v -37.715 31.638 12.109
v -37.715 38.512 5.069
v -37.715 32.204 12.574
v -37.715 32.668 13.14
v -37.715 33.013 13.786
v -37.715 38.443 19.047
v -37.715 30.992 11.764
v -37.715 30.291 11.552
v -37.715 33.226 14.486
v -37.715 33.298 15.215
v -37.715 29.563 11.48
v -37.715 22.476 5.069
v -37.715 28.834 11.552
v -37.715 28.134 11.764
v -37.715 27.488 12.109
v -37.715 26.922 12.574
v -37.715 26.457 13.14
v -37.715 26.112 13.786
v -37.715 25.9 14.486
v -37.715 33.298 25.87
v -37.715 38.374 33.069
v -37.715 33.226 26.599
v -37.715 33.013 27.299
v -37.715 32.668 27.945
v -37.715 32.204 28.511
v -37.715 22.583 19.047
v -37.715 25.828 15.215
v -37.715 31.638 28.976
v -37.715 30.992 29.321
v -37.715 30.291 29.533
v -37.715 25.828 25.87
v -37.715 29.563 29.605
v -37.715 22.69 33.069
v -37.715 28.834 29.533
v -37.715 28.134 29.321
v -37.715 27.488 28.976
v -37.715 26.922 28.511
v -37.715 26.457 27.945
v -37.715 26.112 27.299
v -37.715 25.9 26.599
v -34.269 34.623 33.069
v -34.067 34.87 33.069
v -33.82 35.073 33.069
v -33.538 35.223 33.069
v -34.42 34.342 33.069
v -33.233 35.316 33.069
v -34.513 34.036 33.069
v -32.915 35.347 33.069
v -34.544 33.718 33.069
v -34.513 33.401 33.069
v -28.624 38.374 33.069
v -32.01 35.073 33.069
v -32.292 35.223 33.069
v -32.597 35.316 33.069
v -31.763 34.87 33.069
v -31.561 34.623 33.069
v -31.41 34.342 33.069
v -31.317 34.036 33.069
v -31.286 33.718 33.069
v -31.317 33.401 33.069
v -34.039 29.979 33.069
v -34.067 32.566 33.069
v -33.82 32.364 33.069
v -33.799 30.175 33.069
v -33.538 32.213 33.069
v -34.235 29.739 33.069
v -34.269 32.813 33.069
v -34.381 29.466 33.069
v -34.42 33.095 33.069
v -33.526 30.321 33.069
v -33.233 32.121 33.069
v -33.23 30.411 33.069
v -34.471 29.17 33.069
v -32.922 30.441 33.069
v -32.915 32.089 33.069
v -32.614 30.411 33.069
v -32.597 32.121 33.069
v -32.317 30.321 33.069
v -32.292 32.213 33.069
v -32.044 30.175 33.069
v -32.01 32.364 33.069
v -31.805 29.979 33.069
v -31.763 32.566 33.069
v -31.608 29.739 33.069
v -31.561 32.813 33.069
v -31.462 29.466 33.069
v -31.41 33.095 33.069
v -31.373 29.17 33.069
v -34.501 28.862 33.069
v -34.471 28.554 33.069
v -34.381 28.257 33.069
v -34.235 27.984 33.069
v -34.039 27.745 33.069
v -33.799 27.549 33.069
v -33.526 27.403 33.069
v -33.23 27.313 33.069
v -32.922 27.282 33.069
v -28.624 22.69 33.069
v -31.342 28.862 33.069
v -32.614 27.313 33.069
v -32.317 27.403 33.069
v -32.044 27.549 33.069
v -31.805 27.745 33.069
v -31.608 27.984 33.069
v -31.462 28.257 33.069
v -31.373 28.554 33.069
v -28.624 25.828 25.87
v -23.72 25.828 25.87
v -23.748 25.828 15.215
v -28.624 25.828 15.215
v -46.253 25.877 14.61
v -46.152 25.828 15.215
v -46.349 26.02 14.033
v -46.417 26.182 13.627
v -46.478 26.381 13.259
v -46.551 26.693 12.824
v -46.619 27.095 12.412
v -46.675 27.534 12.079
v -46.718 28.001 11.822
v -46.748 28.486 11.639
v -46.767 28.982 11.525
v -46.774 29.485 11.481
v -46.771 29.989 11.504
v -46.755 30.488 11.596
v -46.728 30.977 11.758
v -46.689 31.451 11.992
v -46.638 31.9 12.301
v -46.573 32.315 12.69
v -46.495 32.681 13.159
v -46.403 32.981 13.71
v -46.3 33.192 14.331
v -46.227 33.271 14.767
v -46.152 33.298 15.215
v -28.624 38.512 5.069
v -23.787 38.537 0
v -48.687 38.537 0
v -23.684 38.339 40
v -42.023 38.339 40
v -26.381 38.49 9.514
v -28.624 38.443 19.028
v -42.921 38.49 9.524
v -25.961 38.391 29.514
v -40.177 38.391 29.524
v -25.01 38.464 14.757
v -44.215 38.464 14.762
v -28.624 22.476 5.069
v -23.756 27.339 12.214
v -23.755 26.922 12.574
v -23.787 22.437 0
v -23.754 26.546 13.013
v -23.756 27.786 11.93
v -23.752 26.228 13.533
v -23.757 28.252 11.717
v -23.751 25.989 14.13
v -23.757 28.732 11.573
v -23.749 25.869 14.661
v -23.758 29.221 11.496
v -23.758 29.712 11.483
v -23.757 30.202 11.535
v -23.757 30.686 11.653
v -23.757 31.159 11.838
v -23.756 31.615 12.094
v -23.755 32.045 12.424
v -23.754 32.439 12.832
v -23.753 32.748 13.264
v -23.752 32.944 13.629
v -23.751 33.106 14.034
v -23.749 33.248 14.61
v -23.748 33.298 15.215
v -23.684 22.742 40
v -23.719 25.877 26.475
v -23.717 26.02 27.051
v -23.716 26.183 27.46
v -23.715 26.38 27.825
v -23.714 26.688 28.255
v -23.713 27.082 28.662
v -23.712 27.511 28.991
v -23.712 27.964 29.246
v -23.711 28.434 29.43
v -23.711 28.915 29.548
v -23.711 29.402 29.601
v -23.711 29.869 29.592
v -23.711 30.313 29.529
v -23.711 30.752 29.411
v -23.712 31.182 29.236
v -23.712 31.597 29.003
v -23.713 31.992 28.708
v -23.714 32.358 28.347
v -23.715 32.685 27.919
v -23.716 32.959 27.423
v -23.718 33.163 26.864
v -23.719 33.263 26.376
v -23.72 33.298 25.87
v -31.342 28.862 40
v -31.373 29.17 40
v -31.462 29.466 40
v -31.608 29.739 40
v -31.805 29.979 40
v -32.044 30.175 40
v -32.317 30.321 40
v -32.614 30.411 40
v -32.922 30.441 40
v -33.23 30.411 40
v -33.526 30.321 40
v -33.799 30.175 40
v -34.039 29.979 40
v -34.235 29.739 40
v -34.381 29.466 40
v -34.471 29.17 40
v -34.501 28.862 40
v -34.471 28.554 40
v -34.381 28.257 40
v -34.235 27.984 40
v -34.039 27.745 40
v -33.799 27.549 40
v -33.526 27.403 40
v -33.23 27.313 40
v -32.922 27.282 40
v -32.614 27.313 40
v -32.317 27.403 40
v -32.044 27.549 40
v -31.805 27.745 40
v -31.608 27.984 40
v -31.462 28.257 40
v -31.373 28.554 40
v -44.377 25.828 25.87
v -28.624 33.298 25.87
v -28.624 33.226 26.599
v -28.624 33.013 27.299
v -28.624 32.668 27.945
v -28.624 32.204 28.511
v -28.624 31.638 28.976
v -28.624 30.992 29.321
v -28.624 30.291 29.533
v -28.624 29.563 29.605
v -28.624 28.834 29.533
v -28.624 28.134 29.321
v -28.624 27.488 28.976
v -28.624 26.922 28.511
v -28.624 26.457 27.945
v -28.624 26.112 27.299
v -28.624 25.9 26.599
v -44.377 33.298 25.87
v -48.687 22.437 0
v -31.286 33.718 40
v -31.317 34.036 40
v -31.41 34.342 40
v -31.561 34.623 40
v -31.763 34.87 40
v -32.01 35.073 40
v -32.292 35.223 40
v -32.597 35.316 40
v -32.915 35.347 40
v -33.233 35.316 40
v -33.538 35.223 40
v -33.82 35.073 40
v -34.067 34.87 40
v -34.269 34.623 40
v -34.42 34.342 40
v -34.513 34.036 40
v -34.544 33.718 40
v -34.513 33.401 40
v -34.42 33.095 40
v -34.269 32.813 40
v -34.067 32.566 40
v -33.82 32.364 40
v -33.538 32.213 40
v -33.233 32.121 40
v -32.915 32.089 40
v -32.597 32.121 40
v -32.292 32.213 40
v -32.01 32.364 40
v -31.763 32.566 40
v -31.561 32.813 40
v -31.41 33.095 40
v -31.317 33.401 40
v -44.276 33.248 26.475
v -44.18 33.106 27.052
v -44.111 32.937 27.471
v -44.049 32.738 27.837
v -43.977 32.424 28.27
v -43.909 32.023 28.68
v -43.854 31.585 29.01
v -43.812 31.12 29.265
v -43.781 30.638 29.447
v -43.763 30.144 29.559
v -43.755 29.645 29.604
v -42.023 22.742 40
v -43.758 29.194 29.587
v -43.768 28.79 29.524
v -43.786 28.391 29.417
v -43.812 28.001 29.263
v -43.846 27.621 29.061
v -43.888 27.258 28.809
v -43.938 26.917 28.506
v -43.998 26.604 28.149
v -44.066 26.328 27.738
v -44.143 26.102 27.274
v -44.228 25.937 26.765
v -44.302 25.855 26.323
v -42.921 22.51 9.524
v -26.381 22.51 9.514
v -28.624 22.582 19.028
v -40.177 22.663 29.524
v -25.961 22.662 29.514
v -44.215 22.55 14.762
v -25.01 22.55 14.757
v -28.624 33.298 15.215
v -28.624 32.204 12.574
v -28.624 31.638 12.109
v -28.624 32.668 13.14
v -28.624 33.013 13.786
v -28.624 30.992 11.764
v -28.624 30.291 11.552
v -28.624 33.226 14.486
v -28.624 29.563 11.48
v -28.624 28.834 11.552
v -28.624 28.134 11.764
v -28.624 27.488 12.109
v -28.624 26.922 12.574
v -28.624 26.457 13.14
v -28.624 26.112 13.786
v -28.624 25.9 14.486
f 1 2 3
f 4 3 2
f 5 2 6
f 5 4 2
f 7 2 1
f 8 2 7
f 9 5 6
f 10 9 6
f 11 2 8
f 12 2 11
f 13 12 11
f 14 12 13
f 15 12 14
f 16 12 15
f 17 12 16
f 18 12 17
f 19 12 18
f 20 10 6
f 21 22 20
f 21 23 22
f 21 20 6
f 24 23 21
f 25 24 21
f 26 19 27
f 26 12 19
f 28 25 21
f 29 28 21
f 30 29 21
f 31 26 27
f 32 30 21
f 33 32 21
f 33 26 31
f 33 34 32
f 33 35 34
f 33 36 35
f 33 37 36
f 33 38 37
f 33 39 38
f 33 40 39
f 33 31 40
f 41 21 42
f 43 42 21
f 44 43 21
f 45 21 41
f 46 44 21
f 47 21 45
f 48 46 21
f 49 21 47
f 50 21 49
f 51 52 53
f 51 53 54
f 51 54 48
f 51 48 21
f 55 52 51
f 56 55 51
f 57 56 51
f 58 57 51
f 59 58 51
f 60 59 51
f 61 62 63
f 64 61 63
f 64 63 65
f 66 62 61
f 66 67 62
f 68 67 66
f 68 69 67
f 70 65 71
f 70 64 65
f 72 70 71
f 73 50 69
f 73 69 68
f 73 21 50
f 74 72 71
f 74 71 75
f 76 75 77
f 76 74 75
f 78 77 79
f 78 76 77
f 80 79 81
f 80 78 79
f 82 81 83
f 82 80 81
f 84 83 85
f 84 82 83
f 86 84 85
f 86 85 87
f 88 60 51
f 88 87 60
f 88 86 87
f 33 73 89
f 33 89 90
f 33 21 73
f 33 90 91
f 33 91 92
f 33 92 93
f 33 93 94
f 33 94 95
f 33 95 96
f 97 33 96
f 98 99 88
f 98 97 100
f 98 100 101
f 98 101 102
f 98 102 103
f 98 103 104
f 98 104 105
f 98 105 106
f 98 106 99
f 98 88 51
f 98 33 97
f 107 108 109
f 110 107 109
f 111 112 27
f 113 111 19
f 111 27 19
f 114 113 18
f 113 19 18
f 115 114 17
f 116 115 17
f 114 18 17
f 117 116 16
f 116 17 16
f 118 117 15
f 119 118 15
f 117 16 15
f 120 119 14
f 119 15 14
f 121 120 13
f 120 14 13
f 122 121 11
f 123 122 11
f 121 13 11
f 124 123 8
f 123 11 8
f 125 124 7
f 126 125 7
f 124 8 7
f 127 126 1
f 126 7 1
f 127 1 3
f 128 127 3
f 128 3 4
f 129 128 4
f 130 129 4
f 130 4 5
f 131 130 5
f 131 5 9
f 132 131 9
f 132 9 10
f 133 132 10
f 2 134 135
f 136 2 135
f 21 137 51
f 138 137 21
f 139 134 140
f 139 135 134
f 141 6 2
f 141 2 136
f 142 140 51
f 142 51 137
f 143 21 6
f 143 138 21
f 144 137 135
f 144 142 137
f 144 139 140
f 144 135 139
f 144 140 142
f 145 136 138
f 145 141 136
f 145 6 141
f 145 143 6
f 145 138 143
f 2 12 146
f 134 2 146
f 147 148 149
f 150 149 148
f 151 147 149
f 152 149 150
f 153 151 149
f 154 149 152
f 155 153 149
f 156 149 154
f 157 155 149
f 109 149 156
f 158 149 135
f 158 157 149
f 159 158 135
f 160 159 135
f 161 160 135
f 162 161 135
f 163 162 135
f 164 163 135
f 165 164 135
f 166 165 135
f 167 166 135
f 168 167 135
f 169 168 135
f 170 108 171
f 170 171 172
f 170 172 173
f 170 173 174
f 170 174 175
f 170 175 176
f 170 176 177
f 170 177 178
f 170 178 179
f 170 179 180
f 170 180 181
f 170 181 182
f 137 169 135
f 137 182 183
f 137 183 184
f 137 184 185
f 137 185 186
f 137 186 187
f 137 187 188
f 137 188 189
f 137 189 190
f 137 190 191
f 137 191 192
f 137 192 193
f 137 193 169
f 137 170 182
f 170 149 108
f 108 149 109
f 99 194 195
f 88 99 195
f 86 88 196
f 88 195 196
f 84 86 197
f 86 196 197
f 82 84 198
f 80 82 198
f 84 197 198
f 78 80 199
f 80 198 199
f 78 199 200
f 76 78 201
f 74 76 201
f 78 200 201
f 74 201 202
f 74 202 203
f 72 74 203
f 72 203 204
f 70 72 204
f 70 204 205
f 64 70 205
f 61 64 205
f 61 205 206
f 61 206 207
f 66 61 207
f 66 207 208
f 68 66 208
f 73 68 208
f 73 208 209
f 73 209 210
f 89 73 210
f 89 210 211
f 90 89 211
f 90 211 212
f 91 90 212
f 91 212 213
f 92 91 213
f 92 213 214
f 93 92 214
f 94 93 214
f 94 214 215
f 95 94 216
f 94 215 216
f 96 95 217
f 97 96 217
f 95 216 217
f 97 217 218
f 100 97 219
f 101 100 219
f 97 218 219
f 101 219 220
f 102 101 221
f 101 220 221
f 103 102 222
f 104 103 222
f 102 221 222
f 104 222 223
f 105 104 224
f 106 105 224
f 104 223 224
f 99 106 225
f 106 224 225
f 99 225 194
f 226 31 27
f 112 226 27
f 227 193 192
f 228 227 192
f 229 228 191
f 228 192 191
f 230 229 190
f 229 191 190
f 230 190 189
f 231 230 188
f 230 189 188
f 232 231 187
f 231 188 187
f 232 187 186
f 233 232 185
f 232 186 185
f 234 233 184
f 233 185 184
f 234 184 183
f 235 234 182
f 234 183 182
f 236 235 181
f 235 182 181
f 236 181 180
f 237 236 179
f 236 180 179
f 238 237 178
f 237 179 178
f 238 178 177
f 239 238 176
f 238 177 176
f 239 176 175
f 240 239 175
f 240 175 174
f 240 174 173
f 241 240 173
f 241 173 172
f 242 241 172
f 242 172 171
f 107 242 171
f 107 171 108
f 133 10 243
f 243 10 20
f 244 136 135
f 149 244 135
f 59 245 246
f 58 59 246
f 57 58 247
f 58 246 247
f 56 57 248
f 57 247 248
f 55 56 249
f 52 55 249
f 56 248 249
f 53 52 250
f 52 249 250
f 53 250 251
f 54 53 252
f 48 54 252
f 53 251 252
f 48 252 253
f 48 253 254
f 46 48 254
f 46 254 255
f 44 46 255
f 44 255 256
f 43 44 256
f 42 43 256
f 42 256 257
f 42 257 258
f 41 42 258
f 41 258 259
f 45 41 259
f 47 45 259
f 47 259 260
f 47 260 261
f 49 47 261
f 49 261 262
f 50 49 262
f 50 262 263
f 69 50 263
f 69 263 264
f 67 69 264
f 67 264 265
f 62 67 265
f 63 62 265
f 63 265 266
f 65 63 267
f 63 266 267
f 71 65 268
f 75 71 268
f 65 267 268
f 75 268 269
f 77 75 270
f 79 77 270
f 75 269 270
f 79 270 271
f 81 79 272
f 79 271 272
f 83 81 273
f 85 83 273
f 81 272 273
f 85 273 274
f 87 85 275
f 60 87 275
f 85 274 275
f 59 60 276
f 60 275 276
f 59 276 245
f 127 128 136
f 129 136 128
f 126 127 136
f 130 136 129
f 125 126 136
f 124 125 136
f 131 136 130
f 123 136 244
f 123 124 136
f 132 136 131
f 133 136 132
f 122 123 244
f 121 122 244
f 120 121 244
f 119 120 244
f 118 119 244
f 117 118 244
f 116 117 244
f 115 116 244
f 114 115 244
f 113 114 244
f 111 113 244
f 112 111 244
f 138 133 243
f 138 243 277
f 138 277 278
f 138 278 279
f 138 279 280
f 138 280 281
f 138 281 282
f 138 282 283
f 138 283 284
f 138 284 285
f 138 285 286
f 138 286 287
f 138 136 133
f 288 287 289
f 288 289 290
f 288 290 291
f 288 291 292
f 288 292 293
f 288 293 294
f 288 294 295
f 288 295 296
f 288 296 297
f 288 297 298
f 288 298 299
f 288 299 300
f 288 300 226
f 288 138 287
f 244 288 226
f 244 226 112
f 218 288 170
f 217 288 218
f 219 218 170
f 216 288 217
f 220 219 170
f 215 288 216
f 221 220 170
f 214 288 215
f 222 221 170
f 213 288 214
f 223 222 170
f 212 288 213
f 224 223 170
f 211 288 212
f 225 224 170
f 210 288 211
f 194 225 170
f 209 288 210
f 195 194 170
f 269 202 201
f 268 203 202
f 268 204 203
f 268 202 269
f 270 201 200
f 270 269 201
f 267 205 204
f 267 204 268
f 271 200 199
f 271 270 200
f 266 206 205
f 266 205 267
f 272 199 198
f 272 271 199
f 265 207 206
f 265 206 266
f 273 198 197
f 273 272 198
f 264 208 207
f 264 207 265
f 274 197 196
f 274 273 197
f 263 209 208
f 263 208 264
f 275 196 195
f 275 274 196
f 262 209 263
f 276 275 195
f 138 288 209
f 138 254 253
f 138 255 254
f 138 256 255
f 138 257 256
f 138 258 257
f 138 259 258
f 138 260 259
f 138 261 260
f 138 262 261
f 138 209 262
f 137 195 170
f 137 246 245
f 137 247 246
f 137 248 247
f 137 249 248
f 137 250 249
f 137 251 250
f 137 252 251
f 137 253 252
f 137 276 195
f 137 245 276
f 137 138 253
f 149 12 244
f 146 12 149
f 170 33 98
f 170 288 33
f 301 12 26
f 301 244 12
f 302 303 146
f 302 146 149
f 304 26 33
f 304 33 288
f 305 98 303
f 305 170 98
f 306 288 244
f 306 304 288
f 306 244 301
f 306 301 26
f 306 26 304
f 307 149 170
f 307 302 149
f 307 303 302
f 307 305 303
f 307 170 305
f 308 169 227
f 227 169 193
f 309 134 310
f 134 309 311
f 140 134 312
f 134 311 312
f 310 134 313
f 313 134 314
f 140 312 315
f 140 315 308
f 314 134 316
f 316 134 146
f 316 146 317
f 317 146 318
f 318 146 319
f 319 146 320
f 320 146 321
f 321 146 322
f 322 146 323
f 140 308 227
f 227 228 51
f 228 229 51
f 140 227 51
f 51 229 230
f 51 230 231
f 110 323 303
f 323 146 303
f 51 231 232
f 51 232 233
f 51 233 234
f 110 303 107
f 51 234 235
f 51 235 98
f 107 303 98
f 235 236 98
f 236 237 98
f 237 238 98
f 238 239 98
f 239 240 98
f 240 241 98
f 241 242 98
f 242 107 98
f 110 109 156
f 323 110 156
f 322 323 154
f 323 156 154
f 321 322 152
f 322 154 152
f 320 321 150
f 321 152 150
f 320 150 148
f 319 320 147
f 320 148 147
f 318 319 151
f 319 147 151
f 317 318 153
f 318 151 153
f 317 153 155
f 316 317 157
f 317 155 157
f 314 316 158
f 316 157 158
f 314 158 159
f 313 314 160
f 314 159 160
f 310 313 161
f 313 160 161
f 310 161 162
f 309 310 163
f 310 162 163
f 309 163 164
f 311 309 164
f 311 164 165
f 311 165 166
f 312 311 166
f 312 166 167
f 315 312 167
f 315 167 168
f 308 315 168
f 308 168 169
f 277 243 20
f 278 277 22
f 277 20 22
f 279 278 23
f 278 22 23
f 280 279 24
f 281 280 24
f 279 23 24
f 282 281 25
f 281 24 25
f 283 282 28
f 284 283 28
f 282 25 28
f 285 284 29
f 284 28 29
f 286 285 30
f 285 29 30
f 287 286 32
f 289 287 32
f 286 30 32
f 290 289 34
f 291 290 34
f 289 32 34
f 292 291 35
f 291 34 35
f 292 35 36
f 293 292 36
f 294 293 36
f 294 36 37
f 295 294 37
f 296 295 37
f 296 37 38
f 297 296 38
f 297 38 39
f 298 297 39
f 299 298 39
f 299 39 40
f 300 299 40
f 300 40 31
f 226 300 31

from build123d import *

# Parameters (mm, degrees)
F1_W      = 24.9
F1_H      = 16.1
F2_W      = 18.339114
F2_H      = 15.596803
F4_W      = 9.09091
F4_H      = 28
F5_DEPTH  = 43.97606
F7_DEPTH  = 48.58648
F8_R      = 1.628979
F9_DEPTH  = 25
F10_R     = 1.57945
F11_DEPTH = 25


with BuildPart() as f3:
    # F1 (on Top) → F3 section 0
    with BuildSketch(Plane.XY):
        with Locations((-36.237153, 30.487152)):
            Rectangle(F1_W, F1_H)
    # F2 (on offset) → F3 section 1
    with BuildSketch(Plane.XY.offset(40)):
        with Locations((-32.853606, 30.5409)):
            Rectangle(F2_W, F2_H)
    loft()

    # F4 (on Front) → F5 (cut)
    with BuildSketch(Plane.XZ):
        with Locations((-33.169536, 19.06869)):
            Rectangle(F4_W, F4_H)
    extrude(amount=-F5_DEPTH, mode=Mode.SUBTRACT)

    # F6 (on Right) → F7 (cut)
    with BuildSketch(Plane.YZ):
        with BuildLine():
            ThreePointArc((33.29777, 25.870029), (29.562821, 29.604978), (25.827872, 25.870029))
            Line((25.827872, 25.870029), (25.827872, 15.214866))
            ThreePointArc((25.827872, 15.214866), (29.562821, 11.479917), (33.29777, 15.214866))
            Line((33.29777, 15.214866), (33.29777, 25.870029))
        make_face()
    extrude(amount=-F7_DEPTH, mode=Mode.SUBTRACT)

    # F8 (on offset) → F9 (cut)
    with BuildSketch(Plane.XY.offset(40)):
        with Locations((-32.914963, 33.718325)):
            Circle(F8_R)
    extrude(amount=-F9_DEPTH, mode=Mode.SUBTRACT)

    # F10 (on offset) → F11 (cut)
    with BuildSketch(Plane.XY.offset(40)):
        with Locations((-32.921717, 28.86181)):
            Circle(F10_R)
    extrude(amount=-F11_DEPTH, mode=Mode.SUBTRACT)


solid = f3.part
